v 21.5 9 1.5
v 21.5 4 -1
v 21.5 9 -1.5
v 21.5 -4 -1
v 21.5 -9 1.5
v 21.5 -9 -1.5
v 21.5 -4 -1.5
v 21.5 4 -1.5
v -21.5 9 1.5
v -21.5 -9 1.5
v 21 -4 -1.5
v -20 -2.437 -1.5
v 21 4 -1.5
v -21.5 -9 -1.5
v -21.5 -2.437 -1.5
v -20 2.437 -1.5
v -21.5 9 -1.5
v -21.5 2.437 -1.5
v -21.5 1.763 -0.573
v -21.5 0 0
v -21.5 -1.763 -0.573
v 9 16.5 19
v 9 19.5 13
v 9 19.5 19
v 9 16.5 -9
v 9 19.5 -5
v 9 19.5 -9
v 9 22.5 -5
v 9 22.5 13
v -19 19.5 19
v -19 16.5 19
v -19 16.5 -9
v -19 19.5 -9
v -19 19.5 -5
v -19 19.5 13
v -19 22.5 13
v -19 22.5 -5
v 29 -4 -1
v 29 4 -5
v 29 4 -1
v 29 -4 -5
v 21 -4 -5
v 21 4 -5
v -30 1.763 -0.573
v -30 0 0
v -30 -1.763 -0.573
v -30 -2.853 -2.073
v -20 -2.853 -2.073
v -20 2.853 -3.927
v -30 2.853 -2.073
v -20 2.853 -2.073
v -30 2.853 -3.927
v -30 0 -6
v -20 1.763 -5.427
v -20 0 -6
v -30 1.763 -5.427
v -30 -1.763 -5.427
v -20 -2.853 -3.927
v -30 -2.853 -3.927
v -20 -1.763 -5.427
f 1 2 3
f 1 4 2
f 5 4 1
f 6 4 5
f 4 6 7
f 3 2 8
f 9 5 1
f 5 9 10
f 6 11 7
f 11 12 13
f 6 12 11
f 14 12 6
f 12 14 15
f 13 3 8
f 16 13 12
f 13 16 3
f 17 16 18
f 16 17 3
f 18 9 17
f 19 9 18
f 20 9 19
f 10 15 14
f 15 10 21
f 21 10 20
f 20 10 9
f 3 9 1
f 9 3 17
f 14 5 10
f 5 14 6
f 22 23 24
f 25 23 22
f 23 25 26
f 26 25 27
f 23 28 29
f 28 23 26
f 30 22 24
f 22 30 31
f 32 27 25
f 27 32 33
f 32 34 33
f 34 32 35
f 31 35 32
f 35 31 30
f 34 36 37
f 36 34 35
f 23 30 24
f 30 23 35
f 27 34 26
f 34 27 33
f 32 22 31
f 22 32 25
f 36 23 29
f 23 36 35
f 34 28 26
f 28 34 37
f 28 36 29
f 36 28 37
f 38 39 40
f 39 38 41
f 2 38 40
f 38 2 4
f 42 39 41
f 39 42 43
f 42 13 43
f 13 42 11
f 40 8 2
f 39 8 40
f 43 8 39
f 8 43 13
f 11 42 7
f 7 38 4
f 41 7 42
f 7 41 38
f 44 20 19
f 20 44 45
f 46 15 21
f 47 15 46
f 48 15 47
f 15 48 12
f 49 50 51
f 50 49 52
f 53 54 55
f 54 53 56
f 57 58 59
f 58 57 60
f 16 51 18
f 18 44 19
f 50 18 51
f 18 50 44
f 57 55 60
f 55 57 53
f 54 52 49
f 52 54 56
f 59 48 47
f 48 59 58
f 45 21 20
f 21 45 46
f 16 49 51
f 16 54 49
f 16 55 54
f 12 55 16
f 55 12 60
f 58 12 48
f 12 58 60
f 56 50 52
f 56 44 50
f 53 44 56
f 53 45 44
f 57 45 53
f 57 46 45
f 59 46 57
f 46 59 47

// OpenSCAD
/*
 * Copyright (C) 2016 Peter Withers
 */

/*
 * testing_tool_case.scad
 *
 * Created: 21/03/2016 23:18
 * Author : Peter Withers <peter@gthb-bambooradical.com>
 */

lcdHoleSpacing = 23;
lcdBoardWidth = 28; // the board is square
lcdDisplayHeight = 18; // the lcd is as wide as the board

atmegaBoardWidth = 18;
atmegaBoardLength = 43;

gapBetweenBoardEdgeAndLcd = 5;

usbWidth = 8;
usbHeight = 4;

translate([0,5,5]) %cube([atmegaBoardLength, 30, lcdBoardWidth+5], center = true);
cube([atmegaBoardLength, atmegaBoardWidth, 3], center = true);
translate([-5,18,5]) cube([lcdBoardWidth, 3, lcdBoardWidth], center = true);
translate([-5,20,4]) cube([lcdBoardWidth, 5, lcdDisplayHeight], center = true);
translate([25,0,-3]) cube([usbWidth, usbWidth, usbHeight], center = true);
translate([-25,0,-3]) rotate(90, [0,1,0]) cylinder(r = 3, h = 10, center = true);
